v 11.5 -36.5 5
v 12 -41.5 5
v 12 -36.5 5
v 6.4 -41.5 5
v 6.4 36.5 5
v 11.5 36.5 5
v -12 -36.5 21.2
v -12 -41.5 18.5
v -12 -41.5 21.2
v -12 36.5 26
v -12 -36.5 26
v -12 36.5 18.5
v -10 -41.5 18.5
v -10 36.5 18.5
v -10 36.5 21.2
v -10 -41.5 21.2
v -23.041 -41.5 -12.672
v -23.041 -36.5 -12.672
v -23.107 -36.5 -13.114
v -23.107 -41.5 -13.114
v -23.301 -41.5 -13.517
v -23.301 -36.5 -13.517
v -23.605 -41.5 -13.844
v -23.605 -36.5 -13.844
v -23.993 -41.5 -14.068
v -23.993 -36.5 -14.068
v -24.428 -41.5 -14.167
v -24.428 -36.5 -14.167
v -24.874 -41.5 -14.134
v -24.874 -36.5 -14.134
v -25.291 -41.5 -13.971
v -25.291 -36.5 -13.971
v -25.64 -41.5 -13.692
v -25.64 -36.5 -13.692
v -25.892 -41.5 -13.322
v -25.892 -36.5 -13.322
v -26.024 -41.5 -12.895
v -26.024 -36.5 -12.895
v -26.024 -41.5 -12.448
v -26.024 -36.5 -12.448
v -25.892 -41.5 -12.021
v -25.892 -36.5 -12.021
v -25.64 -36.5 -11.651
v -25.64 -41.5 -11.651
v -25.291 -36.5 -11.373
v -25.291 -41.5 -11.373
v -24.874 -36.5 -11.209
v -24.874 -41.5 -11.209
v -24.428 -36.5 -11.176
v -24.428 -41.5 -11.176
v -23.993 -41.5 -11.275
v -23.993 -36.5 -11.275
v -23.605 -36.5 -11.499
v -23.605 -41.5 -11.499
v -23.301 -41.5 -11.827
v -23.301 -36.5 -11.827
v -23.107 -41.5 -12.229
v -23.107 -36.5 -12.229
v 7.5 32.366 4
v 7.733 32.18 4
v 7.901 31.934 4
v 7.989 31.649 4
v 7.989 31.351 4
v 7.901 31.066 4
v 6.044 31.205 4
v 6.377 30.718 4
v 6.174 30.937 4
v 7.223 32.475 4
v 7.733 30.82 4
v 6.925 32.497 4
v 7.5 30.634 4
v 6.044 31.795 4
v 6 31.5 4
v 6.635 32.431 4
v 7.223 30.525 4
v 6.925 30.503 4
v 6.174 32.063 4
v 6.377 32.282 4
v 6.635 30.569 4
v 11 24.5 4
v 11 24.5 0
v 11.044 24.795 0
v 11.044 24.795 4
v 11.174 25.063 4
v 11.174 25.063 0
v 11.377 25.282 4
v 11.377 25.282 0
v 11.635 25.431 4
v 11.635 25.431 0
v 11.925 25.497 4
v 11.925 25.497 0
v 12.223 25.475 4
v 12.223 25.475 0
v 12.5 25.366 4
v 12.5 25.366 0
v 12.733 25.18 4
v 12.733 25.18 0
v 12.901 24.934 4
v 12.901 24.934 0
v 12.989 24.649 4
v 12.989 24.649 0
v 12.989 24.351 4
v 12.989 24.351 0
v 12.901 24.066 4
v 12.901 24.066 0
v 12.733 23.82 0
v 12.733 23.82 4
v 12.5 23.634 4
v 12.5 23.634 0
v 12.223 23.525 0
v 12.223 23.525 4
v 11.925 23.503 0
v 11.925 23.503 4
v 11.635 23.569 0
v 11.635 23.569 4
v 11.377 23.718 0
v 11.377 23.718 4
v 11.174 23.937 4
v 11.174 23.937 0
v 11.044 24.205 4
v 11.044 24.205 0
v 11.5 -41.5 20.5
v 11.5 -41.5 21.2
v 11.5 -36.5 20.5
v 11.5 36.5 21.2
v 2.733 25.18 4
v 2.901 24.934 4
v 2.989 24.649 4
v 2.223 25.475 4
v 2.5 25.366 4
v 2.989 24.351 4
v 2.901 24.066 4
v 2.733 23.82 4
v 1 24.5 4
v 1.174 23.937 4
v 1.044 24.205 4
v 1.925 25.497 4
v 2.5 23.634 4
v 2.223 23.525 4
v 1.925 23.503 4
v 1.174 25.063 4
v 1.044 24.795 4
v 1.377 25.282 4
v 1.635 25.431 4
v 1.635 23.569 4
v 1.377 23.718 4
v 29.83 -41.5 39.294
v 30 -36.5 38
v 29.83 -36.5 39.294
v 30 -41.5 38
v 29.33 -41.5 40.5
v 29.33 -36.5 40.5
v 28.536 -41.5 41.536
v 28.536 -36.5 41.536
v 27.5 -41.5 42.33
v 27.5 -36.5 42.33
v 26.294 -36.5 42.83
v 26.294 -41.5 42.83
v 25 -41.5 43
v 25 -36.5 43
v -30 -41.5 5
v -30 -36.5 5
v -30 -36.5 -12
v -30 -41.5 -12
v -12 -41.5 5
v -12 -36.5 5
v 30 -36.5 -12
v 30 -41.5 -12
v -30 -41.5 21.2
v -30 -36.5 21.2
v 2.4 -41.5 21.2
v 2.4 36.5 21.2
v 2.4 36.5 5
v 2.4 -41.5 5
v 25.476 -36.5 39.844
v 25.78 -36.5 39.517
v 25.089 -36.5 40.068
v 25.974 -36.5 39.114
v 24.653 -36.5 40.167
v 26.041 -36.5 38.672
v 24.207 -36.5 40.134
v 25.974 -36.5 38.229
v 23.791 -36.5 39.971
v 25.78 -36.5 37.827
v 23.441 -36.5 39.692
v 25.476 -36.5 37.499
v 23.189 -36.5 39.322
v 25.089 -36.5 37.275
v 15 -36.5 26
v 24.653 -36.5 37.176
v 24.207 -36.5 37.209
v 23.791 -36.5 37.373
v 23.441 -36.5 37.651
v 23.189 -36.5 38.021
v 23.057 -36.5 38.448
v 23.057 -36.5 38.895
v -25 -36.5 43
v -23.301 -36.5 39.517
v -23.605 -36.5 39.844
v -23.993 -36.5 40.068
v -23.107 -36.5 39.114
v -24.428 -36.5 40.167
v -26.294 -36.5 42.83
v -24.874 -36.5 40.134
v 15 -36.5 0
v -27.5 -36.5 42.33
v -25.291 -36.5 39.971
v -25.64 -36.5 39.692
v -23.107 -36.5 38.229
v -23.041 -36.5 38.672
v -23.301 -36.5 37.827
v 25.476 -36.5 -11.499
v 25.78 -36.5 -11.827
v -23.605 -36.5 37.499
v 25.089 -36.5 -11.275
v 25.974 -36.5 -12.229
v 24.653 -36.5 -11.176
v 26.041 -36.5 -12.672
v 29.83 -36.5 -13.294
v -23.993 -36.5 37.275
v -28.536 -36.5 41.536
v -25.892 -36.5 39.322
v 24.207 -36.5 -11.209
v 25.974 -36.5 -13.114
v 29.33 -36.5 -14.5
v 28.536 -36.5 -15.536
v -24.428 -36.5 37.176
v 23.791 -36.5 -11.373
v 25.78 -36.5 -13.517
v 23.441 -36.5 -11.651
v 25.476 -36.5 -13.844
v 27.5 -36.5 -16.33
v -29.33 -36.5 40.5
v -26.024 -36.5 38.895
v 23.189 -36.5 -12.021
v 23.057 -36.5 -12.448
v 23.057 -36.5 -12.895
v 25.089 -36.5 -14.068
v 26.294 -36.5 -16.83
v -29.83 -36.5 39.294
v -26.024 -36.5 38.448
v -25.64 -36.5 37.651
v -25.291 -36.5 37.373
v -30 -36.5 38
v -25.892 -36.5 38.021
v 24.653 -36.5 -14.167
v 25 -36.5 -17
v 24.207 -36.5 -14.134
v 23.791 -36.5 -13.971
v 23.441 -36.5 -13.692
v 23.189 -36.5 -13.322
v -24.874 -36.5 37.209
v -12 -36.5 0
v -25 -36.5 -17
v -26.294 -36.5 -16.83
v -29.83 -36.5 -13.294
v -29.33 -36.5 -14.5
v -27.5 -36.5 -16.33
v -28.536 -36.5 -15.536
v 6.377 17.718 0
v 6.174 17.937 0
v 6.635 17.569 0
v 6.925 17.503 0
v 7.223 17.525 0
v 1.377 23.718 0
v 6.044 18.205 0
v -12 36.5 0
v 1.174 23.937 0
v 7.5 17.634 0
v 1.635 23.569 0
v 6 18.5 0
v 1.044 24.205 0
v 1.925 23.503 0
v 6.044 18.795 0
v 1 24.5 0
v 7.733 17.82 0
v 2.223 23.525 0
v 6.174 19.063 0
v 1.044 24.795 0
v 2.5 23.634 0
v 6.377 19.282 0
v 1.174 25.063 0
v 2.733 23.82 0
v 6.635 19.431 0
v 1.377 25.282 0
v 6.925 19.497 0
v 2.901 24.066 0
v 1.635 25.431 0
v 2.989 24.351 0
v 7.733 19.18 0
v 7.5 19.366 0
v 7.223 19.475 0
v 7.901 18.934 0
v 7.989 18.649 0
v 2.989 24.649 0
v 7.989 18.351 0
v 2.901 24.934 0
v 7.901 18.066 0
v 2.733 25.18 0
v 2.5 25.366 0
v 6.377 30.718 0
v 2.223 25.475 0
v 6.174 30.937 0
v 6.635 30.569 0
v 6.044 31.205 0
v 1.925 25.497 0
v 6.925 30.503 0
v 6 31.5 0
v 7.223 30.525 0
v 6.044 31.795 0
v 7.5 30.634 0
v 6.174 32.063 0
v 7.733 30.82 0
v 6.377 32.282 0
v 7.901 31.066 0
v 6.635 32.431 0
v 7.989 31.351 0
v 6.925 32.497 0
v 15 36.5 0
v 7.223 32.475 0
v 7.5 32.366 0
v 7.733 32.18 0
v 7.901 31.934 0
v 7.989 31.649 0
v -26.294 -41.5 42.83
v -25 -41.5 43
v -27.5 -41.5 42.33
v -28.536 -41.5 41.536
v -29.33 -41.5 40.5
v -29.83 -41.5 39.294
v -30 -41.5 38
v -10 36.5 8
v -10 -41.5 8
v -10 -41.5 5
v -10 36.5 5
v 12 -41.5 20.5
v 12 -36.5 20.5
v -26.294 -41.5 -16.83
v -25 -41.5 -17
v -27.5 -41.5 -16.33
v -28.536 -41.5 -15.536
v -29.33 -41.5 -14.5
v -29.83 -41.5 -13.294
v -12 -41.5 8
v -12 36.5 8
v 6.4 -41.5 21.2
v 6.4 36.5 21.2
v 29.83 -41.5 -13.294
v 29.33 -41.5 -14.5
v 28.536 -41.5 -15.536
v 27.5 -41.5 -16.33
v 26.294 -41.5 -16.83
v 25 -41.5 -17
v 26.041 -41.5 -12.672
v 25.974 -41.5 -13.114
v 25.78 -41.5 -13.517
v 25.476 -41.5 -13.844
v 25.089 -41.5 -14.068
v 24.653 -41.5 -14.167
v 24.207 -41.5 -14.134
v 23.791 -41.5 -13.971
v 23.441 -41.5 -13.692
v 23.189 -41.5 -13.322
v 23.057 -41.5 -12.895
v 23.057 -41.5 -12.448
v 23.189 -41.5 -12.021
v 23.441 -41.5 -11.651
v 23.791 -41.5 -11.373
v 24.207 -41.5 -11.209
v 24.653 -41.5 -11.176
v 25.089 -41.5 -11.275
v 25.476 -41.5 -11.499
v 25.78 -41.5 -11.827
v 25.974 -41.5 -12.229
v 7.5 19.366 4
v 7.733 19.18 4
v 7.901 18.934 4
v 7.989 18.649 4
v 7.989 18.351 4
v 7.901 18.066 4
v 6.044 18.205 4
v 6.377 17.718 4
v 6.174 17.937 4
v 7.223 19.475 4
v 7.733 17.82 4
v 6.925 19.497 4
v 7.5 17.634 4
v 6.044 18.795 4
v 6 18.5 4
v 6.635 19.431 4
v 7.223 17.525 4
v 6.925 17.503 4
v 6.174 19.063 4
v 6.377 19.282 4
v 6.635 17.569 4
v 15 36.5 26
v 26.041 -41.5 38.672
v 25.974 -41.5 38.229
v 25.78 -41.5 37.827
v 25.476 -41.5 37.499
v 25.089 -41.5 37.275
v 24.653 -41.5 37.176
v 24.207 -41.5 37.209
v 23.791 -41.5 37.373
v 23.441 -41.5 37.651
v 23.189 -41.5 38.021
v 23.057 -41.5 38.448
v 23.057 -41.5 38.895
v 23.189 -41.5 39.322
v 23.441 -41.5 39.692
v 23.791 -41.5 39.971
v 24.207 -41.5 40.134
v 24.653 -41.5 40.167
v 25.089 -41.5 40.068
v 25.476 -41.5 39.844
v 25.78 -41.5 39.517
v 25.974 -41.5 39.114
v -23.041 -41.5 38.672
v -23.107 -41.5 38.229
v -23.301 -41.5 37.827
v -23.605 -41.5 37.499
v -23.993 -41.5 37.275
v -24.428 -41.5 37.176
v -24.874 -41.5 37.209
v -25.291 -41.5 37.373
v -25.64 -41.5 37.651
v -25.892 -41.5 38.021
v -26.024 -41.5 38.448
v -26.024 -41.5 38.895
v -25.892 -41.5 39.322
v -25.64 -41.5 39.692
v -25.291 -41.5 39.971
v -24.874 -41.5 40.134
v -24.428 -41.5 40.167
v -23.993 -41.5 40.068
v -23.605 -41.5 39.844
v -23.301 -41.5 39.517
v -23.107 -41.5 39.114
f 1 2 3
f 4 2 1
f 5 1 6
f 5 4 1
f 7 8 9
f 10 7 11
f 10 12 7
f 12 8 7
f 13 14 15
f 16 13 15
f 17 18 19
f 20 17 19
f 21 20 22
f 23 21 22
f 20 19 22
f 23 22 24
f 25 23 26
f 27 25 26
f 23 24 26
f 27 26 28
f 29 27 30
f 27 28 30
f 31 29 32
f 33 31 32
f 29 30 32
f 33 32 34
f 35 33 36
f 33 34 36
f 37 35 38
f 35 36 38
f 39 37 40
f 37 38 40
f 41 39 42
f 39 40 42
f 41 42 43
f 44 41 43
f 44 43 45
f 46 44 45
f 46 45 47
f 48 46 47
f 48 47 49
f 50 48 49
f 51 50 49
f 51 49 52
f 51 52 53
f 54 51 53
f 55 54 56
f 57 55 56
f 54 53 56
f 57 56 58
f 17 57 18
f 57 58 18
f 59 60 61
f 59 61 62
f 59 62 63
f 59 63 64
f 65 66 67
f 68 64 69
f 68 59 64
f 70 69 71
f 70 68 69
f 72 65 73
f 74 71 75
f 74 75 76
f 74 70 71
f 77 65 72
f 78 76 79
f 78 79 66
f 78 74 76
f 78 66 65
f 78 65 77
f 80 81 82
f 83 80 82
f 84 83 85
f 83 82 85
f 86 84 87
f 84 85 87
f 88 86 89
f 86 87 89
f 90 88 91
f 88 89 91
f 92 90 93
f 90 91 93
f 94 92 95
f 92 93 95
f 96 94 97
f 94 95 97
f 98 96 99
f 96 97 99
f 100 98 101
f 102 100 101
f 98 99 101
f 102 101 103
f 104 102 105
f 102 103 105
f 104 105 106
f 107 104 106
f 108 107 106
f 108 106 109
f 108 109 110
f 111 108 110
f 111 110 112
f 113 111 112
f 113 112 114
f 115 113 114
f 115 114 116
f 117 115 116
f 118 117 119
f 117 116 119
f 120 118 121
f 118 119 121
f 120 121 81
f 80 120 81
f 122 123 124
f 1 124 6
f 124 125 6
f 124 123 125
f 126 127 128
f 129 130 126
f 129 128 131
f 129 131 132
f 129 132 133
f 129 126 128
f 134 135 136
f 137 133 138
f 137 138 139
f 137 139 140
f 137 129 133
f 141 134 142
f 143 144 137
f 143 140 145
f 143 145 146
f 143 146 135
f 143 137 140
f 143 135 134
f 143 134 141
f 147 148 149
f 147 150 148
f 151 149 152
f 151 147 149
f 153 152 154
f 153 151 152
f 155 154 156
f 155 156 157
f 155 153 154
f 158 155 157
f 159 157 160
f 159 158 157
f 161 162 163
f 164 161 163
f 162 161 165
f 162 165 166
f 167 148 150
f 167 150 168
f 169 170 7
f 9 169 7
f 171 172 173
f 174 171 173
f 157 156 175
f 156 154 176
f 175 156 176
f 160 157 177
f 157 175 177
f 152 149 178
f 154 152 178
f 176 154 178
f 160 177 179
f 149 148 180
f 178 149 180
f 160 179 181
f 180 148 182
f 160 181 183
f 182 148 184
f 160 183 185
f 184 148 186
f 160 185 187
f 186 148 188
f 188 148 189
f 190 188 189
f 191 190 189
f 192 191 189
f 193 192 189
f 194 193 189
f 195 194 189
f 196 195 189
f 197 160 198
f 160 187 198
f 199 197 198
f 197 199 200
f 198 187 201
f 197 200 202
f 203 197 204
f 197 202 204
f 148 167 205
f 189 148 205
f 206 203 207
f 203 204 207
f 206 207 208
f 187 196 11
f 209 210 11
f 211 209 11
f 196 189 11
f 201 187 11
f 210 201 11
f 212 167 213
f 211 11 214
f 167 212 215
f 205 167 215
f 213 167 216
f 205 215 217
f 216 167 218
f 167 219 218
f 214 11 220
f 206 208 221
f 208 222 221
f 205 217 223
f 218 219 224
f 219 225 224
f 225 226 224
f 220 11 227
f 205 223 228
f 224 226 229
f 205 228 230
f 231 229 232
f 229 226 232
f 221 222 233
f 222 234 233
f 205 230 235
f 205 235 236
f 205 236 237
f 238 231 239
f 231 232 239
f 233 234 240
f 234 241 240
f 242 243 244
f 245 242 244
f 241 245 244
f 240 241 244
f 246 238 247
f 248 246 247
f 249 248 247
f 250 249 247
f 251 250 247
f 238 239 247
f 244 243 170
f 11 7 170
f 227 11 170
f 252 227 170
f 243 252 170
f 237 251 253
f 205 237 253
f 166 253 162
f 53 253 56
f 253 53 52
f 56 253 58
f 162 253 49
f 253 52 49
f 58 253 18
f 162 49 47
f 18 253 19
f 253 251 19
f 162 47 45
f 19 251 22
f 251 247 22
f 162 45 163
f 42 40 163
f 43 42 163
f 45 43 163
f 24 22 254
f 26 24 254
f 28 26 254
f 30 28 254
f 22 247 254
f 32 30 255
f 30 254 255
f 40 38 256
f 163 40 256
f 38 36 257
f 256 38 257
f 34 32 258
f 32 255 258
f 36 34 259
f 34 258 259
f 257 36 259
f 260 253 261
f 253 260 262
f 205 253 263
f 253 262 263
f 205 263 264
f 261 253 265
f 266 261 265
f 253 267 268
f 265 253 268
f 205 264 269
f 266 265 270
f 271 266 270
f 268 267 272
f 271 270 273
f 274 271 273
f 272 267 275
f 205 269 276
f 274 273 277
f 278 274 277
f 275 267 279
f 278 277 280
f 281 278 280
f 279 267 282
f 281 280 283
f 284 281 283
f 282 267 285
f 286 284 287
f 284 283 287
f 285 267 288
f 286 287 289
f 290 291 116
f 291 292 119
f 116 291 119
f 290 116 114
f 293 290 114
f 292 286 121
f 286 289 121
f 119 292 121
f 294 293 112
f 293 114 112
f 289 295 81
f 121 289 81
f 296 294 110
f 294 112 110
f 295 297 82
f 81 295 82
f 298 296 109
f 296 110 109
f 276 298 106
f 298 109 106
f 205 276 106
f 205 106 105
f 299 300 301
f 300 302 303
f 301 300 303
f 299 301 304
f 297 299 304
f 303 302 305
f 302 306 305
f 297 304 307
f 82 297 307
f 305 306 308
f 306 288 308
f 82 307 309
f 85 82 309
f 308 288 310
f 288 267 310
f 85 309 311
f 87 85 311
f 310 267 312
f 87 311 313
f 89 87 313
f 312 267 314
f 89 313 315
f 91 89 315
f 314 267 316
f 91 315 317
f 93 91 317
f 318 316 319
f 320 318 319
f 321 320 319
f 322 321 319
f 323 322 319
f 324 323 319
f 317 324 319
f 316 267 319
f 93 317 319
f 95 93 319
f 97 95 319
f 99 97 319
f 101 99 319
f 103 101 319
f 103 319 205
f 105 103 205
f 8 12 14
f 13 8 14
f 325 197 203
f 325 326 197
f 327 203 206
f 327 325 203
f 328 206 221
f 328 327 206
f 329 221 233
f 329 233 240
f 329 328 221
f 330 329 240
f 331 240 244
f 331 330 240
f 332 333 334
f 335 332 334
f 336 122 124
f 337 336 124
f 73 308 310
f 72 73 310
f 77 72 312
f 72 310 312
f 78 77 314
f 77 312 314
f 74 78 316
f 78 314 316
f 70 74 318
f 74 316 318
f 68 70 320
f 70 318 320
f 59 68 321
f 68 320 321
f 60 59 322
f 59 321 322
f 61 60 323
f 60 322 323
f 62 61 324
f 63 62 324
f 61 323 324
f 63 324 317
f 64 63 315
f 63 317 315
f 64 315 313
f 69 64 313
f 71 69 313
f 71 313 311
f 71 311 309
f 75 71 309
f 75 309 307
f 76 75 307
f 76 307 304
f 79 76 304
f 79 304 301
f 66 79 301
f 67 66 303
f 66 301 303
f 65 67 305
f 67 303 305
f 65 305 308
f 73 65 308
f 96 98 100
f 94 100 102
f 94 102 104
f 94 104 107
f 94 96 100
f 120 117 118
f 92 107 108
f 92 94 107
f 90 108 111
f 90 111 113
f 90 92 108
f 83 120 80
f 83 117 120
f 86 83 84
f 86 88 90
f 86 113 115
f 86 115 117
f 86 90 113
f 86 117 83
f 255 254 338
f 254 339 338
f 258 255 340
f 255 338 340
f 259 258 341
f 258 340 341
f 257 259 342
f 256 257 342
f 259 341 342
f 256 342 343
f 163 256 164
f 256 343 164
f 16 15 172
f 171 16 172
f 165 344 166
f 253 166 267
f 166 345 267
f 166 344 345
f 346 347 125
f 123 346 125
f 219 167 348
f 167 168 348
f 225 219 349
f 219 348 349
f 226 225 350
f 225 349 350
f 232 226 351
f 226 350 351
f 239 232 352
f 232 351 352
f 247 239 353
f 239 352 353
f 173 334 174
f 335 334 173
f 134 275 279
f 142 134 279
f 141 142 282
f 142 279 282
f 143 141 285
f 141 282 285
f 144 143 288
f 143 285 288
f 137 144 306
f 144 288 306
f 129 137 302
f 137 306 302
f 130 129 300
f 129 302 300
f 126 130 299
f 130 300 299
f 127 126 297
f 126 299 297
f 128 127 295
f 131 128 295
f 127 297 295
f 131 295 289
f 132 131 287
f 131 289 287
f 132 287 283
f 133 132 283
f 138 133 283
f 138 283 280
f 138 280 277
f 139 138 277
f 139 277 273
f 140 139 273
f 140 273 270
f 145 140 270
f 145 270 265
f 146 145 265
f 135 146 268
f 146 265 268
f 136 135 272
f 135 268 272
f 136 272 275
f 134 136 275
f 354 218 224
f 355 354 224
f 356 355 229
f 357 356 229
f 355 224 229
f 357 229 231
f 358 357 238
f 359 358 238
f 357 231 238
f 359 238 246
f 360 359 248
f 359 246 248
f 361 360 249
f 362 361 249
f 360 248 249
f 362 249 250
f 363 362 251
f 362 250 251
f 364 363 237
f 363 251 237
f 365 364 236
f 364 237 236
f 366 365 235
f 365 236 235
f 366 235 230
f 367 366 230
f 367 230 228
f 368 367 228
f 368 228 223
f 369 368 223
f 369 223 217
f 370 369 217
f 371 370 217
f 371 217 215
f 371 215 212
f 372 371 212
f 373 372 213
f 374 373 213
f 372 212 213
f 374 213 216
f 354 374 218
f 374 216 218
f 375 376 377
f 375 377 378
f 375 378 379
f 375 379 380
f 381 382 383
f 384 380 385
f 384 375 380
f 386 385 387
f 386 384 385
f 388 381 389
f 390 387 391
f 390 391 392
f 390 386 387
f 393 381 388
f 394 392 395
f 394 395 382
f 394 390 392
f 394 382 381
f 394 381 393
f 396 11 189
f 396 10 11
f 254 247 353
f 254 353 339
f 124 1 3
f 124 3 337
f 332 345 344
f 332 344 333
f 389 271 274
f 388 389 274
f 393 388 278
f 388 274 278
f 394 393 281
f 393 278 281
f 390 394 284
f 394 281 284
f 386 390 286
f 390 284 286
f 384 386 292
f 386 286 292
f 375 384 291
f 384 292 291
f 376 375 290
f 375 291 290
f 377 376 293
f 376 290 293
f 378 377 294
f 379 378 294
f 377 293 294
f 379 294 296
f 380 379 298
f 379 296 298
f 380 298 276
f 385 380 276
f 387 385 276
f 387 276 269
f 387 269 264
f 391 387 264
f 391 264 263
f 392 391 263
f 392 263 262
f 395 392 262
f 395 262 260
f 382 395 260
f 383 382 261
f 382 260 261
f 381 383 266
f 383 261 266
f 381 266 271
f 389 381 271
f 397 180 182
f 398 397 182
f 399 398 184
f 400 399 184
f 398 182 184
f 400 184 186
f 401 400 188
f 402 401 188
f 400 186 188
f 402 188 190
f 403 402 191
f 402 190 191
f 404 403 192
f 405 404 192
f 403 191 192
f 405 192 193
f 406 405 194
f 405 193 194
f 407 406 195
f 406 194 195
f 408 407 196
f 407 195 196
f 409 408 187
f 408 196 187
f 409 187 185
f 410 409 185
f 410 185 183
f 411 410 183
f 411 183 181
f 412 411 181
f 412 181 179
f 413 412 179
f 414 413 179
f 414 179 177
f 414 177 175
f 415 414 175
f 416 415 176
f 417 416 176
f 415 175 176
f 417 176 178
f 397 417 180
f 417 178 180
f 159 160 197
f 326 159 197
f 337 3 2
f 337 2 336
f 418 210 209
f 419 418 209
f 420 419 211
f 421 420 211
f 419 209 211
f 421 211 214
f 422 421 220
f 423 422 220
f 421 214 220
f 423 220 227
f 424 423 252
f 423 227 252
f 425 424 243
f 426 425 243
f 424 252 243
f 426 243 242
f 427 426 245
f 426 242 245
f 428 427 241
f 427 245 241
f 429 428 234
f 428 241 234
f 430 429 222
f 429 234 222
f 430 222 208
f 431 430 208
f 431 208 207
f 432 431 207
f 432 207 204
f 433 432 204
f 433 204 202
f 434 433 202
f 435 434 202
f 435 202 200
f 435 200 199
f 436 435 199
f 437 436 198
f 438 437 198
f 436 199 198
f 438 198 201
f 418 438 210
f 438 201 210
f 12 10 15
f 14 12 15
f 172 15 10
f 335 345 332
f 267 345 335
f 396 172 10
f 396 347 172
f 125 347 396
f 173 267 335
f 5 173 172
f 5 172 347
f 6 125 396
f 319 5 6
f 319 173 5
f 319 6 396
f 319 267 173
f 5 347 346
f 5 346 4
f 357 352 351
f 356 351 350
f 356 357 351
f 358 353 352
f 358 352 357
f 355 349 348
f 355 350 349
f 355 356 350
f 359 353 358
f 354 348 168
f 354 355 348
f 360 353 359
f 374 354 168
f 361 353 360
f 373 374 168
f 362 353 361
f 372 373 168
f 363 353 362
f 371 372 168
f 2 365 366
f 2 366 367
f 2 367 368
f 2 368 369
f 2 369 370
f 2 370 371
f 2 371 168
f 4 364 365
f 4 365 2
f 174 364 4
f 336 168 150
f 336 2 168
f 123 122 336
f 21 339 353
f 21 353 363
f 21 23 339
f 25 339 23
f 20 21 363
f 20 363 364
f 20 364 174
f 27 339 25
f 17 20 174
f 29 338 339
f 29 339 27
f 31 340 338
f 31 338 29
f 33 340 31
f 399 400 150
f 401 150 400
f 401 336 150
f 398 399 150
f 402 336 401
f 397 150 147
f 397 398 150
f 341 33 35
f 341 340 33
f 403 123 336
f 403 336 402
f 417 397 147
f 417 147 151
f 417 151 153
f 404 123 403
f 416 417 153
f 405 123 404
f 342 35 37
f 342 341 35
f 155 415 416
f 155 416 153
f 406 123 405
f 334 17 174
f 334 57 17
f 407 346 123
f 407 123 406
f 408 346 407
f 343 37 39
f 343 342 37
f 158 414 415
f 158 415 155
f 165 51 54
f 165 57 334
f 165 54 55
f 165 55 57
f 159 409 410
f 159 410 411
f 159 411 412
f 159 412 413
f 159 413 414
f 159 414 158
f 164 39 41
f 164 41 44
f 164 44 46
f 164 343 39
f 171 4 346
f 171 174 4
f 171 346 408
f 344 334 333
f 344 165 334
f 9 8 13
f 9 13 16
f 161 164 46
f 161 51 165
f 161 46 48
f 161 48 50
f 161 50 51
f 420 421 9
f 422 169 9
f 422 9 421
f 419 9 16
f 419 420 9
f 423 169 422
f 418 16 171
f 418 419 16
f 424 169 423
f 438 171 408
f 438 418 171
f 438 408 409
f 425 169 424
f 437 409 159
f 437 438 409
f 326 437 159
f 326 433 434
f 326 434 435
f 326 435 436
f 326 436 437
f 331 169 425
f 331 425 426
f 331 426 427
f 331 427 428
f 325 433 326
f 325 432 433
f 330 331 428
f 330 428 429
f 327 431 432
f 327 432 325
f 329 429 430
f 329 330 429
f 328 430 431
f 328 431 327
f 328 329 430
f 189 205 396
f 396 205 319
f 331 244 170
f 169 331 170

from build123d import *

# Parameters (mm, degrees)
SKETCH1_W           = 30
SKETCH1_H           = 73
BOSS_EXTRUDE1_DEPTH = 26
SKETCH2_W           = 25
SKETCH2_H           = 16.2
CUT_EXTRUDE1_DEPTH  = 74
SKETCH3_W           = 26
SKETCH3_H           = 24
SKETCH3_H_2         = 16.23422306
CUT_EXTRUDE2_DEPTH  = 5
SKETCH5_W           = 60
SKETCH5_H           = 60
BOSS_EXTRUDE2_DEPTH = 5
FILLET1_R           = 5
SKETCH6_R           = 1.5
CUT_EXTRUDE4_DEPTH  = 5
SKETCH7_R           = 1
CUT_EXTRUDE5_DEPTH  = 4
SKETCH8_W           = 15.5
SKETCH8_H           = 5
CUT_EXTRUDE6_DEPTH  = 42
SKETCH9_W           = 5
SKETCH9_H           = 26
CUT_EXTRUDE7_DEPTH  = 73
SKETCH10_W          = 2
SKETCH10_H          = 8
SKETCH10_H_2        = 7.5
BOSS_EXTRUDE3_DEPTH = 78
SKETCH11_W          = 41.5
SKETCH11_H          = 0.7
CUT_EXTRUDE8_DEPTH  = 6
SKETCH13_W          = 0.7
SKETCH13_H          = 5
BOSS_EXTRUDE5_DEPTH = 2
SKETCH15_W          = 4
SKETCH15_H          = 16.2
BOSS_EXTRUDE6_DEPTH = 78


with BuildPart() as part:
    # Sketch1 → Boss-Extrude1 (new body)
    with BuildSketch(Plane.XY):
        Rectangle(SKETCH1_W, SKETCH1_H)
    extrude(amount=BOSS_EXTRUDE1_DEPTH)

    # Sketch2 → Cut-Extrude1 (cut, through all)
    with BuildSketch(Plane(origin=(0, 36.5, 0), x_dir=(1, 0, 0), z_dir=(0, 1, 0))):
        with Locations((-1, -13.1)):
            Rectangle(SKETCH2_W, SKETCH2_H)
    extrude(amount=-CUT_EXTRUDE1_DEPTH, mode=Mode.SUBTRACT)

    # Sketch3 → Cut-Extrude2 (cut)
    with BuildSketch(Plane.ZY.offset(15)):
        with Locations((13, 21.5)):
            Rectangle(SKETCH3_W, SKETCH3_H)
        with Locations((13, -5.5)):
            Rectangle(SKETCH3_W, SKETCH3_H)
        with Locations((13, -28.61711153)):
            Rectangle(SKETCH3_W, SKETCH3_H_2)
    extrude(amount=-CUT_EXTRUDE2_DEPTH, mode=Mode.SUBTRACT)

    # Sketch5 → Boss-Extrude2 (add)
    with BuildSketch(Plane(origin=(0, -36.5, 0), x_dir=(-1, 0, 0), z_dir=(0, -1, 0))):
        with Locations((0, -13)):
            Rectangle(SKETCH5_W, SKETCH5_H)
    extrude(amount=BOSS_EXTRUDE2_DEPTH)

    # Fillet1
    fillet1_edges = [part.edges().sort_by_distance(p)[0] for p in [
        (30, -39, -17),
        (30, -39, 43),
        (-30, -39, 43),
        (-30, -39, -17),
    ]]
    fillet(fillet1_edges, radius=FILLET1_R)

    # Sketch6 → Cut-Extrude4 (cut)
    with BuildSketch(Plane(origin=(0, -36.5, 0), x_dir=(1, 0, 0), z_dir=(0, 1, 0))):
        with Locations((-24.540514854, 12.671548216)):
            Circle(SKETCH6_R)
        with Locations((24.540514854, 12.671548216)):
            Circle(SKETCH6_R)
        with Locations((-24.540514854, -38.671548216)):
            Circle(SKETCH6_R)
        with Locations((24.540514854, -38.671548216)):
            Circle(SKETCH6_R)
    extrude(amount=-CUT_EXTRUDE4_DEPTH, mode=Mode.SUBTRACT)

    # Sketch7 → Cut-Extrude5 (cut)
    with BuildSketch(Plane(origin=(0, 0, 0), x_dir=(-1, 0, 0), z_dir=(0, 0, -1))):
        with Locations((-7, 31.5)):
            Circle(SKETCH7_R)
        with Locations((-12, 24.5)):
            Circle(SKETCH7_R)
        with Locations((-2, 24.5)):
            Circle(SKETCH7_R)
        with Locations((-7, 18.5)):
            Circle(SKETCH7_R)
    extrude(amount=-CUT_EXTRUDE5_DEPTH, mode=Mode.SUBTRACT)

    # Sketch8 → Cut-Extrude6 (cut)
    with BuildSketch(Plane.ZY.offset(30)):
        with Locations((12.75, -39)):
            Rectangle(SKETCH8_W, SKETCH8_H)
    extrude(amount=-CUT_EXTRUDE6_DEPTH, mode=Mode.SUBTRACT)

    # Sketch9 → Cut-Extrude7 (cut)
    with BuildSketch(Plane(origin=(0, 36.5, 0), x_dir=(1, 0, 0), z_dir=(0, 1, 0))):
        with Locations((-12.5, -13)):
            Rectangle(SKETCH9_W, SKETCH9_H)
    extrude(amount=-CUT_EXTRUDE7_DEPTH, mode=Mode.SUBTRACT)

    # Sketch10 → Boss-Extrude3 (add)
    with BuildSketch(Plane(origin=(0, 36.5, 0), x_dir=(1, 0, 0), z_dir=(0, 1, 0))):
        with Locations((-11, -4)):
            Rectangle(SKETCH10_W, SKETCH10_H)
        with Locations((-11, -22.25)):
            Rectangle(SKETCH10_W, SKETCH10_H_2)
    extrude(amount=-BOSS_EXTRUDE3_DEPTH)

    # Sketch11 → Cut-Extrude8 (cut, through all)
    with BuildSketch(Plane(origin=(0, -36.5, 0), x_dir=(1, 0, 0), z_dir=(0, 1, 0))):
        with Locations((-9.25, -20.85)):
            Rectangle(SKETCH11_W, SKETCH11_H)
    extrude(amount=-CUT_EXTRUDE8_DEPTH, mode=Mode.SUBTRACT)

    # Sketch13 → Boss-Extrude5 (add)
    with BuildSketch(Plane.ZY.offset(12)):
        with Locations((20.85, -39)):
            Rectangle(SKETCH13_W, SKETCH13_H)
    extrude(amount=-BOSS_EXTRUDE5_DEPTH)

    # Sketch15 → Boss-Extrude6 (add)
    with BuildSketch(Plane(origin=(0, 36.5, 0), x_dir=(1, 0, 0), z_dir=(0, 1, 0))):
        with Locations((4.4, -13.1)):
            Rectangle(SKETCH15_W, SKETCH15_H)
    extrude(amount=-BOSS_EXTRUDE6_DEPTH)


solid = part.part
